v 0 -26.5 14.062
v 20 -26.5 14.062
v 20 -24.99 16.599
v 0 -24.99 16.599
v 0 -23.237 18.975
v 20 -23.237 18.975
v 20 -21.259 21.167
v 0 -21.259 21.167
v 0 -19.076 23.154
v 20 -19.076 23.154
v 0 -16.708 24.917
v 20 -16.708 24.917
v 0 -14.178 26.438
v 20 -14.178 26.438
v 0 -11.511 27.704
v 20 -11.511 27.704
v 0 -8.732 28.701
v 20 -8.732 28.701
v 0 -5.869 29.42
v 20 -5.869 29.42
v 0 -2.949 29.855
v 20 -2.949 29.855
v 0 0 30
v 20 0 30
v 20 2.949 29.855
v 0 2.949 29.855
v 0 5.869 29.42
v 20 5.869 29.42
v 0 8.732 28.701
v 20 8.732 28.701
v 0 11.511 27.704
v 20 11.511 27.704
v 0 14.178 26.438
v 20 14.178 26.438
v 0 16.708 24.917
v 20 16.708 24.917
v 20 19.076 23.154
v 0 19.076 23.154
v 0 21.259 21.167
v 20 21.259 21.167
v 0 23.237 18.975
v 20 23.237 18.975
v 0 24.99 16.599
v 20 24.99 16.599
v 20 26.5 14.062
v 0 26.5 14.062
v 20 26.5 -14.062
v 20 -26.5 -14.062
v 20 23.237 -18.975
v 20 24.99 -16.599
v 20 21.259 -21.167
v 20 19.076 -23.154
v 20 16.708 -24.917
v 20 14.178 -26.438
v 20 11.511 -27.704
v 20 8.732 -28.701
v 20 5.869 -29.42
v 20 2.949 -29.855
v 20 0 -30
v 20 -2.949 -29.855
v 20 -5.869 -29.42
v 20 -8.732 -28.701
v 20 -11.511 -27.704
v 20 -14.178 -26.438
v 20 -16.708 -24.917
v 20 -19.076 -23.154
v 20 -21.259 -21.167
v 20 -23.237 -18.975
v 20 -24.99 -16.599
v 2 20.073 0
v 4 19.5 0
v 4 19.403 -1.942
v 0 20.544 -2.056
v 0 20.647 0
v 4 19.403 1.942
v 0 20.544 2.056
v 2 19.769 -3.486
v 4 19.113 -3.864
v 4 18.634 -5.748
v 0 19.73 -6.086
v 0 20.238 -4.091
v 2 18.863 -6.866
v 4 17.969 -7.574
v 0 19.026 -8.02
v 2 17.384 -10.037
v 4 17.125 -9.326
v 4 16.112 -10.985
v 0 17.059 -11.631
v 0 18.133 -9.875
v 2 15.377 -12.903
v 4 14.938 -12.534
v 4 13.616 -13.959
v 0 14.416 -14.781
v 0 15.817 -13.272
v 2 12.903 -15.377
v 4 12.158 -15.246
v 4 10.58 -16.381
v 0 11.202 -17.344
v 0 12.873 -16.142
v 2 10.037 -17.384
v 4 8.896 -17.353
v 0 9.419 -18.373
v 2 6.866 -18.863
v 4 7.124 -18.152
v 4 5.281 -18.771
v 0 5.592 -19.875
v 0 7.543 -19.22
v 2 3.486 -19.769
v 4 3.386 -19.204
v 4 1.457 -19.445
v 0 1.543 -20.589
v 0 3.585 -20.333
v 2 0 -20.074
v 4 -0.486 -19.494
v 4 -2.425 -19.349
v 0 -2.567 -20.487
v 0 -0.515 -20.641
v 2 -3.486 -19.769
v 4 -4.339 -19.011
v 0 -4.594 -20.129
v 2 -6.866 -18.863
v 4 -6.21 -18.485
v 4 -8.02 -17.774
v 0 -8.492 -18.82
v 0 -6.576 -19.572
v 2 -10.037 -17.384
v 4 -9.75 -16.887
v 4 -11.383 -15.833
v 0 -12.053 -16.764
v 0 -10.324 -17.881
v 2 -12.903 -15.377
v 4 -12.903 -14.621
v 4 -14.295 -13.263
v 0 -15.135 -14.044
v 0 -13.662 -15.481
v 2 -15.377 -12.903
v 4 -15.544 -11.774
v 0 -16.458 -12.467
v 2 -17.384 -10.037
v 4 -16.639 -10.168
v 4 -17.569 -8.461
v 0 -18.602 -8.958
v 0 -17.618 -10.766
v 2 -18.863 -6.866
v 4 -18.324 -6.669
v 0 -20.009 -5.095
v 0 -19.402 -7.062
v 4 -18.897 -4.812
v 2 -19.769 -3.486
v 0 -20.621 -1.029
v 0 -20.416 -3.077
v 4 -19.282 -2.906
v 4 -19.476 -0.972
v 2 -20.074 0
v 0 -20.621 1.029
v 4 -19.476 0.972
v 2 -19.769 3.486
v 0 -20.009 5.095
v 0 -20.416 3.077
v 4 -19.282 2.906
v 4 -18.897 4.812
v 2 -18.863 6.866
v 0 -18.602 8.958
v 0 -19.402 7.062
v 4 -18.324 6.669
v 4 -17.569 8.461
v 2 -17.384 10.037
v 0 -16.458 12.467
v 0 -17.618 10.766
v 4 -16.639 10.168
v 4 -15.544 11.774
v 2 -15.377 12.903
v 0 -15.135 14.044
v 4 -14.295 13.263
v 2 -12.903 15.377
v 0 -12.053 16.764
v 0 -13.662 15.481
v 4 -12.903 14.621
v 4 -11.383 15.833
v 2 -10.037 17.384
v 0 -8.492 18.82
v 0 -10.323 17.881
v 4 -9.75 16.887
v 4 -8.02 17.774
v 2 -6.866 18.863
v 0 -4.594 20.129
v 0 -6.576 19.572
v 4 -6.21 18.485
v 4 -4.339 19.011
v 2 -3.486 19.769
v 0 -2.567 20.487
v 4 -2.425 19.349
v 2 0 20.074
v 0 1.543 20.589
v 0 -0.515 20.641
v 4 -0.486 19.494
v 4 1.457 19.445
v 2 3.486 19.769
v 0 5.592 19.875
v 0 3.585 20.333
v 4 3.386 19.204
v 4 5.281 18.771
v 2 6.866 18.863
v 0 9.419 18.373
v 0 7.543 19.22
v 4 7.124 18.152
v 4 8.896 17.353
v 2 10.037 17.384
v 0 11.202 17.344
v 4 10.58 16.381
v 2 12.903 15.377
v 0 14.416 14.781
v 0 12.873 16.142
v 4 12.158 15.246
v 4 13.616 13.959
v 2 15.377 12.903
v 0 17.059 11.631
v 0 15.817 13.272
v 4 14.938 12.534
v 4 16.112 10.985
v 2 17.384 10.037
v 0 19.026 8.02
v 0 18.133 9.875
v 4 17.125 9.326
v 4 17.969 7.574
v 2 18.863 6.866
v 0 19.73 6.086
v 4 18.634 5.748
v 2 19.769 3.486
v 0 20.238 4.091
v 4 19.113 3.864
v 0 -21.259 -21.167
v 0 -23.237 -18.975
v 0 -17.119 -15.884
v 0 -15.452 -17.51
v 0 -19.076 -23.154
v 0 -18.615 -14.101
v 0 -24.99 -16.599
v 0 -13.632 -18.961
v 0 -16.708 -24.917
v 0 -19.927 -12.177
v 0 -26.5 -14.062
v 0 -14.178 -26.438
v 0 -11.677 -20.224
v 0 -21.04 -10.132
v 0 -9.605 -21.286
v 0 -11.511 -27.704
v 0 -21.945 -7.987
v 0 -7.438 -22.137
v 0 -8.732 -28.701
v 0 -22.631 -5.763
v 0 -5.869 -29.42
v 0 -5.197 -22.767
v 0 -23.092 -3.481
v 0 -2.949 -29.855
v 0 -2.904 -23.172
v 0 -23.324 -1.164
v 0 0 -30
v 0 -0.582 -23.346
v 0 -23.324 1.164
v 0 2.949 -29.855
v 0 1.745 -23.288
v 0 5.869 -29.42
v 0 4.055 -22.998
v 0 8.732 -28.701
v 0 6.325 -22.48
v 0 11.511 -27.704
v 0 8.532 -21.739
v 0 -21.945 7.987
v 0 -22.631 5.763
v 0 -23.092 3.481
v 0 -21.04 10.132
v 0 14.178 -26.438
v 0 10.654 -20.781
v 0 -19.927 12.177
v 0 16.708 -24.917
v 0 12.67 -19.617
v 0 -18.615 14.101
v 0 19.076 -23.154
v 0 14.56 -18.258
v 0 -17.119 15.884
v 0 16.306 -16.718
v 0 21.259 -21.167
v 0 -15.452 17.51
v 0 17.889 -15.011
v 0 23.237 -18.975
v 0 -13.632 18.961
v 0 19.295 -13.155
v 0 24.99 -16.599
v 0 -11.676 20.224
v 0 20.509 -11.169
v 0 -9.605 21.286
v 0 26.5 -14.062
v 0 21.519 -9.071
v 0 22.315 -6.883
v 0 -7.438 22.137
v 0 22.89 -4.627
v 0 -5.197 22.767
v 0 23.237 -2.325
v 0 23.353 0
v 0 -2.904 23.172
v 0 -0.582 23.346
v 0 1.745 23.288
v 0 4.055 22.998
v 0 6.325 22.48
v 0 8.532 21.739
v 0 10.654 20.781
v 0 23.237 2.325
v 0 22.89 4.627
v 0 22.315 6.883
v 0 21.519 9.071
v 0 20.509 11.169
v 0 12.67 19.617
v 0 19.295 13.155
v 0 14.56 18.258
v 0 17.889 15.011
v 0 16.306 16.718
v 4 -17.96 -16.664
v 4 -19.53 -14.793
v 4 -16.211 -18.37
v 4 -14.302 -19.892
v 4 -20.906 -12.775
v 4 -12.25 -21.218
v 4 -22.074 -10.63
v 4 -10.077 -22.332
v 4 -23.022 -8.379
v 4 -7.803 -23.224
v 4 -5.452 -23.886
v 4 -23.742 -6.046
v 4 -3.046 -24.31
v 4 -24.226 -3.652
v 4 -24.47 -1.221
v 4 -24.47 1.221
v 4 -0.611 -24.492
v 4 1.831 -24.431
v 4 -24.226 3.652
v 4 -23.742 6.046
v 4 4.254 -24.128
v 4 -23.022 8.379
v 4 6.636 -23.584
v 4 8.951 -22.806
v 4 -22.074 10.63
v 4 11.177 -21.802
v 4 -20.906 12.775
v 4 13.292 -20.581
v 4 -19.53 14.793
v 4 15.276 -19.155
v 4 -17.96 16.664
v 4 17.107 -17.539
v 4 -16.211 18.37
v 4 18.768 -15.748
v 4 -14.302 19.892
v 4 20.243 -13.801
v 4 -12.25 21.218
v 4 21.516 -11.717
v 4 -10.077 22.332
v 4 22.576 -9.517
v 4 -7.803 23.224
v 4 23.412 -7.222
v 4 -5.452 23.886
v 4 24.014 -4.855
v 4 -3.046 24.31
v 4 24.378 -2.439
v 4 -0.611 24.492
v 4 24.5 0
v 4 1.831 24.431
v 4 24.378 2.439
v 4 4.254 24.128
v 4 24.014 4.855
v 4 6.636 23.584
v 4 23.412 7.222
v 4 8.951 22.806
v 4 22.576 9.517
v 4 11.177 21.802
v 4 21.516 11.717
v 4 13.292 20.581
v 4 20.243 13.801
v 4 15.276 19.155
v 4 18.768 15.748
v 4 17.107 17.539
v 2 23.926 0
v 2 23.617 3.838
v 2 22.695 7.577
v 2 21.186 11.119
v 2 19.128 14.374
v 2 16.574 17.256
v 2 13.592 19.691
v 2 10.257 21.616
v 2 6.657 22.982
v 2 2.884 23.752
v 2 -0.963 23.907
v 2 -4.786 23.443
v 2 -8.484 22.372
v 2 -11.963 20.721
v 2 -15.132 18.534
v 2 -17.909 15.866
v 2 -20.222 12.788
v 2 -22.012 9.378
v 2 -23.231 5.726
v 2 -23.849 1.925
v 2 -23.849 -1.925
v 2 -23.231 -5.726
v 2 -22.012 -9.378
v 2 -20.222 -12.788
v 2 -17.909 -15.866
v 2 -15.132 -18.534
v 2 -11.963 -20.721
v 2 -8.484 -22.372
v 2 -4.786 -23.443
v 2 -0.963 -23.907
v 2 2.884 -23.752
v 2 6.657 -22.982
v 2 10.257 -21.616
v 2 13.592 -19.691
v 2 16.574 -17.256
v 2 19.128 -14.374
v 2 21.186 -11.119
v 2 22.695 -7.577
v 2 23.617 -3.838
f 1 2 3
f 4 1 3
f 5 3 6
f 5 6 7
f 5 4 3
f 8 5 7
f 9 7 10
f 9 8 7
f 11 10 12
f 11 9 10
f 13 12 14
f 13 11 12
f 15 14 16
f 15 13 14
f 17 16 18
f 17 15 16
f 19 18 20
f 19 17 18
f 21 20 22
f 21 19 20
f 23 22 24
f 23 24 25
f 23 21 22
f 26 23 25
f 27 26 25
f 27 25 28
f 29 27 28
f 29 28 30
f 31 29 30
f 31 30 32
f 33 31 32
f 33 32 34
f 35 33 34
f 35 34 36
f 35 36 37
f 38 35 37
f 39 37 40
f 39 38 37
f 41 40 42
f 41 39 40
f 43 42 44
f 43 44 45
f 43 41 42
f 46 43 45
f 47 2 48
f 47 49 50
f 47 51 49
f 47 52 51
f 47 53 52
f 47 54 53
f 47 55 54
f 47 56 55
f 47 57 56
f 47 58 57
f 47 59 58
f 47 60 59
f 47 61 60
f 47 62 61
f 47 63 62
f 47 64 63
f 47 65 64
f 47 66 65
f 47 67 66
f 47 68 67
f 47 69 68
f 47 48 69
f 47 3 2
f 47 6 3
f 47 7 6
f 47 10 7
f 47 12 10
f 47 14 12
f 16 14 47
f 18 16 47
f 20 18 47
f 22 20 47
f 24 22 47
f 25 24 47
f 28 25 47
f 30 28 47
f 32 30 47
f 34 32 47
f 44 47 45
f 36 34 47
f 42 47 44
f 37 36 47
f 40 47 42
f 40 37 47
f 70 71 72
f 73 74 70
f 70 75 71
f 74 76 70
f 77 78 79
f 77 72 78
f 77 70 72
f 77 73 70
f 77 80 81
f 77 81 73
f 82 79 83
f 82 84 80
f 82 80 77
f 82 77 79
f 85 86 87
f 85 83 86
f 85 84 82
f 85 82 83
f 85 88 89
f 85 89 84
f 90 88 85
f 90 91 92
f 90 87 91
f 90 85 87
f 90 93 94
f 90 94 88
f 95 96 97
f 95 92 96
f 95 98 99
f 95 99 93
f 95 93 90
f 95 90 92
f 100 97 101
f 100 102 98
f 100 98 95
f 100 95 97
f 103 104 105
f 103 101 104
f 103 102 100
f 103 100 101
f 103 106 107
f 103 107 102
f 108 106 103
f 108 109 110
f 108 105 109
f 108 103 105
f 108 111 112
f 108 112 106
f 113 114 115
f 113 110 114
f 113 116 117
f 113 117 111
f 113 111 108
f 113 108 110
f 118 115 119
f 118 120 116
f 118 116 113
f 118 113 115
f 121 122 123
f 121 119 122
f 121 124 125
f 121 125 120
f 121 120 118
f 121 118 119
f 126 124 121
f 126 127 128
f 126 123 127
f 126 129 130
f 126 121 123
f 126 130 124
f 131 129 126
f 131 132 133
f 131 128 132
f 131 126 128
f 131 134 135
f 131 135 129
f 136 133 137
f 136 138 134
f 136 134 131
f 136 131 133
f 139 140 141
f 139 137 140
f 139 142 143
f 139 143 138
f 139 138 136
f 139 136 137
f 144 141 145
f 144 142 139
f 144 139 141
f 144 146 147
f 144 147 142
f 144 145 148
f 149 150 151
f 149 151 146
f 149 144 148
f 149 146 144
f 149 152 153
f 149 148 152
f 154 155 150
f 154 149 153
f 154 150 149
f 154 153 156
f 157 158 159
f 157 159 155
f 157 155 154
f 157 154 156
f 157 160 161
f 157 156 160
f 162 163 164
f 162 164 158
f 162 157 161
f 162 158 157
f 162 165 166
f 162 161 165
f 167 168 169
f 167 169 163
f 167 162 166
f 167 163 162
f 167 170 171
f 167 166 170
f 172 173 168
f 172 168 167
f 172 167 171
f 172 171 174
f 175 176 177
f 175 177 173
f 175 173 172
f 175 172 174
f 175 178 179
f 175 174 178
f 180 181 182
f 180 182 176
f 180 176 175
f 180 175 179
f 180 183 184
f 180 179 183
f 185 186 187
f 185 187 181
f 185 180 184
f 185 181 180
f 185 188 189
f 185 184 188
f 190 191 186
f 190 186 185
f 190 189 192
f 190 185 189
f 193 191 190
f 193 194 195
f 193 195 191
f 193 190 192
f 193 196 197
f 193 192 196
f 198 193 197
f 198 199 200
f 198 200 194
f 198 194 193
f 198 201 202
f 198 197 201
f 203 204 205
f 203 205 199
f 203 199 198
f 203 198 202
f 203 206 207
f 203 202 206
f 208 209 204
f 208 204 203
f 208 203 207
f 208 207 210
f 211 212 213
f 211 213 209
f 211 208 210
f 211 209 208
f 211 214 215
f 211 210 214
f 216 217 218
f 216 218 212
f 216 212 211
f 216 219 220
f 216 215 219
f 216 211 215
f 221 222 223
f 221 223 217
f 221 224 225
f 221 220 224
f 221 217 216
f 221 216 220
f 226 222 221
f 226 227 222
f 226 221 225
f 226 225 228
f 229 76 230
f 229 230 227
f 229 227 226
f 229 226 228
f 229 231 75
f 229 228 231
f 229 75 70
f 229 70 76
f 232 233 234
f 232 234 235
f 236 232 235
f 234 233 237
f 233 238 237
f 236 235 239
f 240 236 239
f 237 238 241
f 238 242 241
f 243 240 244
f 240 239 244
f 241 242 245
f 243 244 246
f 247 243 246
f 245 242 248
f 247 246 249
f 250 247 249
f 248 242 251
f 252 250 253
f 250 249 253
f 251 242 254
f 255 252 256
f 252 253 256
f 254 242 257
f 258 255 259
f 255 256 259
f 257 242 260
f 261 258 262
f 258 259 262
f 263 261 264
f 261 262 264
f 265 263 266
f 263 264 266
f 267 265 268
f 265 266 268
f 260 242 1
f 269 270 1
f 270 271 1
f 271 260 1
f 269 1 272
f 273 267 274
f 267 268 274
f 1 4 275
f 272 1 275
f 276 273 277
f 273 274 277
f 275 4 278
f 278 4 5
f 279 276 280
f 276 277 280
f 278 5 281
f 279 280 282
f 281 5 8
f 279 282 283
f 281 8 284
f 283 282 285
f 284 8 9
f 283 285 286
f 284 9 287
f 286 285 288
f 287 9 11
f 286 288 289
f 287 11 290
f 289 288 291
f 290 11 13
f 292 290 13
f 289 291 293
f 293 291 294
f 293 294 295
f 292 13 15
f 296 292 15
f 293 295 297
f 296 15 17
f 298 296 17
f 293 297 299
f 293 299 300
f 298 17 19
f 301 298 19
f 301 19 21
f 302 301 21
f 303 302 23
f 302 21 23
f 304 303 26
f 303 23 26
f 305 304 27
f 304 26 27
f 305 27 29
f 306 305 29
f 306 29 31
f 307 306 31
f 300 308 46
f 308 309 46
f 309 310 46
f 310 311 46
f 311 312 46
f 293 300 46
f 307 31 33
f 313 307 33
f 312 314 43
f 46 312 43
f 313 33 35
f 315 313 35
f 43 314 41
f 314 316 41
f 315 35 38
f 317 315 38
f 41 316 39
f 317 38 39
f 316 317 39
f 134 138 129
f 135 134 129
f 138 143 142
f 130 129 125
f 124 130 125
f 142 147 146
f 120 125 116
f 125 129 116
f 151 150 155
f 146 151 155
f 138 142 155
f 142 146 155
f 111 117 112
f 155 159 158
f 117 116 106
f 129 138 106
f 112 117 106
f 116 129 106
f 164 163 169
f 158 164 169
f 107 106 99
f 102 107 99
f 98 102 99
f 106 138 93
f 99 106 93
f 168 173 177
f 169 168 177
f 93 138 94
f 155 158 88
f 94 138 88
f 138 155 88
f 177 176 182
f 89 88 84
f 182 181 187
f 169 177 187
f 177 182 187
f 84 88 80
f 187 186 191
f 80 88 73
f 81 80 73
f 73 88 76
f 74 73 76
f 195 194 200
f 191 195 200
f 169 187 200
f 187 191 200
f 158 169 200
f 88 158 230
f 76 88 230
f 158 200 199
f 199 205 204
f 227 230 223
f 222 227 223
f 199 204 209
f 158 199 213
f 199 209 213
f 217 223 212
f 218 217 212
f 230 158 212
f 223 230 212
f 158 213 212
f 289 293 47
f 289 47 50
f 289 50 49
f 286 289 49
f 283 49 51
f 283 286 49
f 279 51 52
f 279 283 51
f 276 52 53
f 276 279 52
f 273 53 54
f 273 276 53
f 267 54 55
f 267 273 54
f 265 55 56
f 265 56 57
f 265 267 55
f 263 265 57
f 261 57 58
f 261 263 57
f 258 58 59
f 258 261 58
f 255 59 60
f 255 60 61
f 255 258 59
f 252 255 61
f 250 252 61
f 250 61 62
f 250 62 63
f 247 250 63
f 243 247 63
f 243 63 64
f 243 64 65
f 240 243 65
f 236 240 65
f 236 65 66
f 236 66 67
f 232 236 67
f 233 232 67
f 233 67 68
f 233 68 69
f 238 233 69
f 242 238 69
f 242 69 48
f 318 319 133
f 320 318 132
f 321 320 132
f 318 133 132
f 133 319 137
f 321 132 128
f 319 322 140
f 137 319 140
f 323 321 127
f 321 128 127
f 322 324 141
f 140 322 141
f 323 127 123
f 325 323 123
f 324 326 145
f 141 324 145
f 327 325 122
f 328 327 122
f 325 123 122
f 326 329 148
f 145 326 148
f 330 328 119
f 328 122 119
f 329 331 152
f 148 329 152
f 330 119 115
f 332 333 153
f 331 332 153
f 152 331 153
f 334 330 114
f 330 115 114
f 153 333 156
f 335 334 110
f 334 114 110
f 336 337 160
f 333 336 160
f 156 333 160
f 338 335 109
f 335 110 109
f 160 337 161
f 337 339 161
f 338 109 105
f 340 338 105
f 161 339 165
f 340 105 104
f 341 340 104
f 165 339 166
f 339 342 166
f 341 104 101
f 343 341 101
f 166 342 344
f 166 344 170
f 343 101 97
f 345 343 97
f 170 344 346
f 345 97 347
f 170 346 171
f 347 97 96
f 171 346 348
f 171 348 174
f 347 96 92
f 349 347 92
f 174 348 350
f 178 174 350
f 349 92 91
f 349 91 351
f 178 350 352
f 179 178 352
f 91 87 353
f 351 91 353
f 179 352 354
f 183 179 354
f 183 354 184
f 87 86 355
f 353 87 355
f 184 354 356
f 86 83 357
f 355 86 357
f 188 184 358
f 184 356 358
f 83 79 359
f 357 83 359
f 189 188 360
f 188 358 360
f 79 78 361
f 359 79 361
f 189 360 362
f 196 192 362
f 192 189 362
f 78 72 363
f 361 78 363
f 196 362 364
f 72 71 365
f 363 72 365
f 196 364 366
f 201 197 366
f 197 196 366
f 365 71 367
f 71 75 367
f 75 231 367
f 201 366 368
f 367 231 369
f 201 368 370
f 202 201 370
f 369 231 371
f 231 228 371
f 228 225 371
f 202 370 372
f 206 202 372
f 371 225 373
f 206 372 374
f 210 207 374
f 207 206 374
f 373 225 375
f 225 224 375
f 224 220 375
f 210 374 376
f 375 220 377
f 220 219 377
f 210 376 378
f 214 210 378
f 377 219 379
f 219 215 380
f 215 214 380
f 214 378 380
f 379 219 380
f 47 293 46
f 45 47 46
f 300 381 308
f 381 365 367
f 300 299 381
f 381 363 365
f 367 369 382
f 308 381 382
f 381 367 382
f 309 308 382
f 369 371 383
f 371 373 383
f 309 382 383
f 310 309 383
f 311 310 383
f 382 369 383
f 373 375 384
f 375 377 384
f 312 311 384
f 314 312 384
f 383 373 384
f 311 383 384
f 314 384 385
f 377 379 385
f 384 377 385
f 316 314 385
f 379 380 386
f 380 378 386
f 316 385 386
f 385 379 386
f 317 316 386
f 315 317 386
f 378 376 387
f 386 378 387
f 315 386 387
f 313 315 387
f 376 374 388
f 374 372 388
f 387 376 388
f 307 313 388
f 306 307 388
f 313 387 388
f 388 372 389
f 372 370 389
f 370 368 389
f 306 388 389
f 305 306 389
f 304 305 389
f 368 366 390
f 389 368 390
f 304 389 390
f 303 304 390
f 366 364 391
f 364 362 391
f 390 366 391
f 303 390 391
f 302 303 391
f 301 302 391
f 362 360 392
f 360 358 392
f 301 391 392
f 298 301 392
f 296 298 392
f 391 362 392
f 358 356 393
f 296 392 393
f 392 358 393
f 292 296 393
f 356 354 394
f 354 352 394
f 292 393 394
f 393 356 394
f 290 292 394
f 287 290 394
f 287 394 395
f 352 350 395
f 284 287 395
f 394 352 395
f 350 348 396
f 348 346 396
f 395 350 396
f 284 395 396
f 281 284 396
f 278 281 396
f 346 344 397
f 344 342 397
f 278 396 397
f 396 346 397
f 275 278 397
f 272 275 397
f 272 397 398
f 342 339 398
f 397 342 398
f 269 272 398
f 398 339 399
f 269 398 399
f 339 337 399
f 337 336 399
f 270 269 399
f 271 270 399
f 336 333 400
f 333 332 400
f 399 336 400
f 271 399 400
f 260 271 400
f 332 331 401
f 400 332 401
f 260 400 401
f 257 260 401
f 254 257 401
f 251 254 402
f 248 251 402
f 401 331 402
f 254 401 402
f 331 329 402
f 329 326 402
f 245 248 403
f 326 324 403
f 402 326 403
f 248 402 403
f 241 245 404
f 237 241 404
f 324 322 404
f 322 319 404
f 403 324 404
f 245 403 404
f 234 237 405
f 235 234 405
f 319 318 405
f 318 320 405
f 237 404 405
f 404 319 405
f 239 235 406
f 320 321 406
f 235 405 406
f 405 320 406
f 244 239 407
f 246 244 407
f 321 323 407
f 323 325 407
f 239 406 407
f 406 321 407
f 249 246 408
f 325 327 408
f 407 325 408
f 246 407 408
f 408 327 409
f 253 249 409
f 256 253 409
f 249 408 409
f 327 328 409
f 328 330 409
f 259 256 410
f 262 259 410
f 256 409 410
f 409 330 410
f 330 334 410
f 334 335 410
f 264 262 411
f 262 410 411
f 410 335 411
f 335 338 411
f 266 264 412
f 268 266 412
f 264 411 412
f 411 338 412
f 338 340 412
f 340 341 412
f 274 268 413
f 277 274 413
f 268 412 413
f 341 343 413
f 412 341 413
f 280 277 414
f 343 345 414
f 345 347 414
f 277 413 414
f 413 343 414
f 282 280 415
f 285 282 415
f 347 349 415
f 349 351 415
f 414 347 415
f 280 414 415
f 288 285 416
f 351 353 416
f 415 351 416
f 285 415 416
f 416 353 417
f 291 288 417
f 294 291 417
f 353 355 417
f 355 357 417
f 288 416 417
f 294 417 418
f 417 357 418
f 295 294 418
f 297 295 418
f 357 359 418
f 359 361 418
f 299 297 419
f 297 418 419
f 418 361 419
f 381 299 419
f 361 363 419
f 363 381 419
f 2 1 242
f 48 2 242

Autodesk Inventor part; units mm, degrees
ref_plane "YZ Plane" through (0, 0, 0) normal (1, 0, 0) x (0, 1, 0)
ref_plane "XZ Plane" through (0, 0, 0) normal (0, 1, 0) x (-1, 0, 0)
ref_plane "XY Plane" through (0, 0, 0) normal (0, 0, 1) x (1, 0, 0)
sketch "Эскиз1" plane through (0, 0, 0) normal (0, 0, 1) x (1, 0, 0)
  line L0 (0, 0) -> (20, 0)
  line L1 (20, 0) -> (20, 30)
  line L2 (20, 30) -> (0, 30)
  line L3 (0, 30) -> (0, 0)
  dimension "d0" = 20
  dimension "d1" = 30
revolve "Вращение1" add sketch "Эскиз1" angle 360 about axis through (0, 0, 0) along (1, 0, 0)
sketch "Эскиз2" plane through (0, 0, 0) normal (0, 0, 1) x (1, 0, 0)
  line L0 (0, -30) -> (0, 30) construction
  line L1 (0, 20.647) -> (0, 23.353)
  line L2 (0, 23.353) -> (4, 24.5)
  line L3 (4, 24.5) -> (4, 19.5)
  line L4 (4, 19.5) -> (0, 20.647)
  line L5 (4, 22) -> (0, 22) construction
  line L6 (0, 0) -> (20.0289, 0)
  dimension "d3" = 74
  dimension "d4" = 74
  dimension "d5" = 5
  dimension "d6" = 4
  dimension "d7" = 22
revolve "Вращение2" cut sketch "Эскиз2" angle 360 about axis through (0, 0, 0) along (1, 0, 0)
sketch "Эскиз3" plane through (0, 0, 0) normal (-1, 0, 0) x (0, 0, 1)
  line L0 (-30, -26.5) -> (-30, 26.5)
  line L1 (-30, 26.5) -> (30, 26.5)
  line L2 (30, 26.5) -> (30, -26.5)
  line L3 (30, -26.5) -> (-30, -26.5)
  point P0 (0, 0)
  point P1 (-30, 0)
  point P2 (30, 0)
  point P3 (0, 26.5)
  dimension "d9" = 53
  dimension "d10" = 60
extrude "Выдавливание1" cut sketch "Эскиз3" against normal blind 20 keep common part
properties part number "711117"
